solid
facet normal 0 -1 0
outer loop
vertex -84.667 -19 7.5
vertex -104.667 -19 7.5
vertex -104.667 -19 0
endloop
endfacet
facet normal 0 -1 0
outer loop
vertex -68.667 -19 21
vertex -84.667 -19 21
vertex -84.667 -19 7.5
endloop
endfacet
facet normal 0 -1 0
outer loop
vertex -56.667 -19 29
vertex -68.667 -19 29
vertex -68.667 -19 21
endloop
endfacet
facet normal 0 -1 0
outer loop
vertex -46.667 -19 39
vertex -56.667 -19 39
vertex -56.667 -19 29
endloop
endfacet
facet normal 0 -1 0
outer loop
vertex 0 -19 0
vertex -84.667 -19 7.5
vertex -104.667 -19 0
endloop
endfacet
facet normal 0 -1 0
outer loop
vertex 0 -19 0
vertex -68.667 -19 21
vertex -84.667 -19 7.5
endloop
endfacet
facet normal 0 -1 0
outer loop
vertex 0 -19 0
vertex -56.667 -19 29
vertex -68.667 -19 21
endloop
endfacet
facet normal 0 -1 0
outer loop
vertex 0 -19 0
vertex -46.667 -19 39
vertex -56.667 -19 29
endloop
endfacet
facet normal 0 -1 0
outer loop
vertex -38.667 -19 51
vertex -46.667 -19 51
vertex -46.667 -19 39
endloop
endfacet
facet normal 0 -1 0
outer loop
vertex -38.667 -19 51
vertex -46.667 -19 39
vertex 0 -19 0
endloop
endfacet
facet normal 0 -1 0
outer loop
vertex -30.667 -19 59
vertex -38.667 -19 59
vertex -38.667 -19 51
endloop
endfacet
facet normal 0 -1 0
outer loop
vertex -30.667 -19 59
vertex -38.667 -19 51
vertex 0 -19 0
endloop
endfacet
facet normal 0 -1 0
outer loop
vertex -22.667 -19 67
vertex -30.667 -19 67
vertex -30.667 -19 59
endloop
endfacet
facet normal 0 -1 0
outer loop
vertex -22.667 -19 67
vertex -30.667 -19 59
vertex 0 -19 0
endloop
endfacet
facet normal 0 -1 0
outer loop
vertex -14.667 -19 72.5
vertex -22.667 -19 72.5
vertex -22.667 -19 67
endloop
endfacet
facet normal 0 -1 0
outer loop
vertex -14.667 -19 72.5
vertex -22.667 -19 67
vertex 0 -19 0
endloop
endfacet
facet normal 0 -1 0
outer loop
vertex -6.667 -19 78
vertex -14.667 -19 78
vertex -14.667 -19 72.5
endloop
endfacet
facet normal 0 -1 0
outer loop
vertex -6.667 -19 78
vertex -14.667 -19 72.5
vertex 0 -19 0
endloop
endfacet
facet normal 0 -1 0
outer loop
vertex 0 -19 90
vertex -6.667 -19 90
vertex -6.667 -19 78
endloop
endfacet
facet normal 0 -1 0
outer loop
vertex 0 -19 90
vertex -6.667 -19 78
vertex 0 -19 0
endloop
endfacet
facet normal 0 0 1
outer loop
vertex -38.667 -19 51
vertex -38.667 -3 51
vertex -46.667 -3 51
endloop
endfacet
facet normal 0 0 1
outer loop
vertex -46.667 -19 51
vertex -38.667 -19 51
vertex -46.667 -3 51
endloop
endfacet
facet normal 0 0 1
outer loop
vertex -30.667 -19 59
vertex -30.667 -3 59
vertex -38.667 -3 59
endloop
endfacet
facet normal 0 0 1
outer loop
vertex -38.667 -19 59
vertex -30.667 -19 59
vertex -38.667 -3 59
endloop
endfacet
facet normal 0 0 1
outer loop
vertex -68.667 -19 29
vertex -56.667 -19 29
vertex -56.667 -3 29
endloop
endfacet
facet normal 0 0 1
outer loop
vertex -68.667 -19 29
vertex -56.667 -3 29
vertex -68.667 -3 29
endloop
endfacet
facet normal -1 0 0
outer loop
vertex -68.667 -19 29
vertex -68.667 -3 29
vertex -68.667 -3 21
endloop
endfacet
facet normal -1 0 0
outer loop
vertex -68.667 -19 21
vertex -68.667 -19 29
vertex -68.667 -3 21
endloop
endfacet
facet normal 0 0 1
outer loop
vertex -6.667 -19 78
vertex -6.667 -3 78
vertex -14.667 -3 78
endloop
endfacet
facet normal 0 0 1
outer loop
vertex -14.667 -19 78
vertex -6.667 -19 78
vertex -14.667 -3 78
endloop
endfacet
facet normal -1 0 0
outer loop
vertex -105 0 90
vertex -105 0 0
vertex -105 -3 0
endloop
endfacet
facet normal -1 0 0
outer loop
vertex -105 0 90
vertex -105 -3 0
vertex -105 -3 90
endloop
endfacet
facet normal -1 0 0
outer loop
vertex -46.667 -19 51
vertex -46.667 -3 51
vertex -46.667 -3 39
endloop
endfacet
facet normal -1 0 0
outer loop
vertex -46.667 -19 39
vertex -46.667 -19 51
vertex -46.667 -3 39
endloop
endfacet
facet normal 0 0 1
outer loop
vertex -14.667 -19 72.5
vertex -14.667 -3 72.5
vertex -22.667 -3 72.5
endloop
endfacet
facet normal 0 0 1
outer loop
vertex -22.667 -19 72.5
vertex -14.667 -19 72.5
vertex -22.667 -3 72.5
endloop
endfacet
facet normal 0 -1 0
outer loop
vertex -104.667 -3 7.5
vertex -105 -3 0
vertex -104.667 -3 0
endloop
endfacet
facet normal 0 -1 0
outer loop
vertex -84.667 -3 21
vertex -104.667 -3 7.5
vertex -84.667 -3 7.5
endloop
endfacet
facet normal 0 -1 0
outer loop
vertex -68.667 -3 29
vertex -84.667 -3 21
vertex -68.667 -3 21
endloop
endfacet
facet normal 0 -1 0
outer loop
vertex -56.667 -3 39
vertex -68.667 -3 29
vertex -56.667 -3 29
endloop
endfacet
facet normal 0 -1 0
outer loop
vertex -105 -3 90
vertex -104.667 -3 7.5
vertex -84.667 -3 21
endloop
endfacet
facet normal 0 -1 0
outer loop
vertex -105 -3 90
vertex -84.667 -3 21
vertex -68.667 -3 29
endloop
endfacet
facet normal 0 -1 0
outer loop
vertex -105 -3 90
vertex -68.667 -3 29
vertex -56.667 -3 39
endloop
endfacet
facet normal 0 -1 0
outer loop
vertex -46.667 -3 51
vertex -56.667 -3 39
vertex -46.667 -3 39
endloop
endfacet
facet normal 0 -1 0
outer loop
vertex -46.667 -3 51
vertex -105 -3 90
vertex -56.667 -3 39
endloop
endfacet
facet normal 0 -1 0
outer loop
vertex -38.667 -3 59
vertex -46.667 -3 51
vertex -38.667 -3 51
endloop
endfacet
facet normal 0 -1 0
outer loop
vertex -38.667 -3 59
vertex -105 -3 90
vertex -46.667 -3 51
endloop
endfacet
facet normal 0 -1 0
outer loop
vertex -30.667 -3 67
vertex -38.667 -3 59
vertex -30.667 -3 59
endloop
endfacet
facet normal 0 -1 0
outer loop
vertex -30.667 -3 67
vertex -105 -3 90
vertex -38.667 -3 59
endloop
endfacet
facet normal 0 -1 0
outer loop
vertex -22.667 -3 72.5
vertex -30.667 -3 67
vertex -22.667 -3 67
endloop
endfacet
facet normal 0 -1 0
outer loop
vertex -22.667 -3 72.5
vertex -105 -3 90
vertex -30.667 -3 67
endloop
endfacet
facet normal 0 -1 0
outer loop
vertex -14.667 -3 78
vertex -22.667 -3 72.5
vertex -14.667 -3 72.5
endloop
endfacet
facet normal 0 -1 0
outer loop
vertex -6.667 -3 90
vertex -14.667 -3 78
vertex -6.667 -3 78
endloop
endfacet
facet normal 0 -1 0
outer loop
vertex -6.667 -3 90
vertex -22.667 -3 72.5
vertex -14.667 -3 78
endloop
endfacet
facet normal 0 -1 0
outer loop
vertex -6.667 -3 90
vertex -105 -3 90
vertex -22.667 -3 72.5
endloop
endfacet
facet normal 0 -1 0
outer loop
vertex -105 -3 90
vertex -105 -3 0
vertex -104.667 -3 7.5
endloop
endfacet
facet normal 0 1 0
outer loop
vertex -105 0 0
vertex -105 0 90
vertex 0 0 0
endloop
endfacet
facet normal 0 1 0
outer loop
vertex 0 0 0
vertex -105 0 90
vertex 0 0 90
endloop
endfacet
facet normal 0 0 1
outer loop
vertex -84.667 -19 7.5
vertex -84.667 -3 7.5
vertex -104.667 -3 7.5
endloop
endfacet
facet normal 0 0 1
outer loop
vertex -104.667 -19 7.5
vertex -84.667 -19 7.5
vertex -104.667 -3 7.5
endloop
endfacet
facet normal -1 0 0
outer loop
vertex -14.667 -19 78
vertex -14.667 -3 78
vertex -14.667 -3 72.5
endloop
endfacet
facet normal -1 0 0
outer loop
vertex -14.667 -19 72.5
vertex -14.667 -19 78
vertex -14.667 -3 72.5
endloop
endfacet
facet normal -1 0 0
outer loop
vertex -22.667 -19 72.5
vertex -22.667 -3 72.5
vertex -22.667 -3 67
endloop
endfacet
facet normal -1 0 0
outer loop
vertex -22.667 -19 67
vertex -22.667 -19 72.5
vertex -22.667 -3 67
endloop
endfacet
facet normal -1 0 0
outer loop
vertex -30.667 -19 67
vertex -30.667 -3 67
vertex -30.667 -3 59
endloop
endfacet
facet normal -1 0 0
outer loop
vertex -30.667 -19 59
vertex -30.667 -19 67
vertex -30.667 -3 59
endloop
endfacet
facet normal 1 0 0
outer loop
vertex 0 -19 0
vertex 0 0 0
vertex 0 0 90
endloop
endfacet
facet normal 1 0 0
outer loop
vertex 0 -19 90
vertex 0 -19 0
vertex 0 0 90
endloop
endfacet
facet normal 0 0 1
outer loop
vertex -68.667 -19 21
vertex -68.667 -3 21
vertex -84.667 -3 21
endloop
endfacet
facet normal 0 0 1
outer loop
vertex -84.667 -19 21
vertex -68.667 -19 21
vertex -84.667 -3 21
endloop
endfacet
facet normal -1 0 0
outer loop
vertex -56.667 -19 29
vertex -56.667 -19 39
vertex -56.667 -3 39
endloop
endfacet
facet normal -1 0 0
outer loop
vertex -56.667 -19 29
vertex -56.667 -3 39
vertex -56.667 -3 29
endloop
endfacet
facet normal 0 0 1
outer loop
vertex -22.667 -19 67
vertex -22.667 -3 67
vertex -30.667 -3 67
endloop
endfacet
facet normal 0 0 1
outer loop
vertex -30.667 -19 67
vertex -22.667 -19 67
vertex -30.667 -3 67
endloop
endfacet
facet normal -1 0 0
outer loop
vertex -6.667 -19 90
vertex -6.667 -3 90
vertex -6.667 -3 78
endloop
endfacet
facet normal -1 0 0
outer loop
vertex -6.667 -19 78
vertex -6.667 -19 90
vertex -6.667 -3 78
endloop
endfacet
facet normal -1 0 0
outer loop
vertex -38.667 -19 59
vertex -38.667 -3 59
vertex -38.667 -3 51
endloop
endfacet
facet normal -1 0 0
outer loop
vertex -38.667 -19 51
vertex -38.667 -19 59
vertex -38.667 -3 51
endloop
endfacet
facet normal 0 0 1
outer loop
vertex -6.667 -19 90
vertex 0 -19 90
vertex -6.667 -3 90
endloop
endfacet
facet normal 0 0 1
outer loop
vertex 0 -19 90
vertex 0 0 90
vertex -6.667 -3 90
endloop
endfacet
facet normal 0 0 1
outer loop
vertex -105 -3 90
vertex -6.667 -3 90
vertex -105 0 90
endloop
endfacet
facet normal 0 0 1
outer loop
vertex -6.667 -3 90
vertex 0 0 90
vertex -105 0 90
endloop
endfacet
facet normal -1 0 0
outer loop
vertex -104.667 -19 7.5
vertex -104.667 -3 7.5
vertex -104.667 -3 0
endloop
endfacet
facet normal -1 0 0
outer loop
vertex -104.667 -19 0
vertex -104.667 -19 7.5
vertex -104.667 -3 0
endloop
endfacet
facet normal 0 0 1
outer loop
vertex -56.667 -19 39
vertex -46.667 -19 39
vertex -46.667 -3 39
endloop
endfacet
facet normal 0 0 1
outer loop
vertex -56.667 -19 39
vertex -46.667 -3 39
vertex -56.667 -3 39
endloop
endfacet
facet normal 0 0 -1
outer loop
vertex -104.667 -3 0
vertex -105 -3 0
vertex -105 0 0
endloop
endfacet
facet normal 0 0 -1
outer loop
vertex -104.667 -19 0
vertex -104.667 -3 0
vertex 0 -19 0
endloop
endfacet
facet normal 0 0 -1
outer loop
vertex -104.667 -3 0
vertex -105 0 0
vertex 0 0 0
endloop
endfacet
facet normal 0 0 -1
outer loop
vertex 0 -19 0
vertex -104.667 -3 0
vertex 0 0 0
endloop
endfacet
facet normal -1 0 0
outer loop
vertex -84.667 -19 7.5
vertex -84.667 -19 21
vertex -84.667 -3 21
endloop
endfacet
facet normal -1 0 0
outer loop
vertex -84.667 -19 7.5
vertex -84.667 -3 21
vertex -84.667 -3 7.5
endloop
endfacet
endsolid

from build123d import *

# Parameters (mm, degrees)
F0_W     = 105
F0_H     = 90
F1_DEPTH = 3
F3_DEPTH = 16


with BuildPart() as f1:
    # F0 (on Front) → F1 (new body)
    with BuildSketch(Plane.XZ):
        with Locations((-52.5, 45)):
            Rectangle(F0_W, F0_H)
    extrude(amount=F1_DEPTH)

    # F2 (on face) → F3 (join)
    with BuildSketch(Plane.XZ.offset(3)):
        Polygon((0, 0), (0, 90), (-6.666667, 90), (-6.666667, 78), (-14.666667, 78), (-14.666667, 72.5), (-22.666667, 72.5), (-22.666667, 67), (-30.666667, 67), (-30.666667, 59), (-38.666667, 59), (-38.666667, 51), (-46.666667, 51), (-46.666667, 39), (-56.666667, 39), (-56.666667, 29), (-68.666667, 29), (-68.666667, 21), (-84.666667, 21), (-84.666667, 7.5), (-104.666667, 7.5), (-104.666667, 0), align=None)
    extrude(amount=F3_DEPTH)


solid = f1.part
